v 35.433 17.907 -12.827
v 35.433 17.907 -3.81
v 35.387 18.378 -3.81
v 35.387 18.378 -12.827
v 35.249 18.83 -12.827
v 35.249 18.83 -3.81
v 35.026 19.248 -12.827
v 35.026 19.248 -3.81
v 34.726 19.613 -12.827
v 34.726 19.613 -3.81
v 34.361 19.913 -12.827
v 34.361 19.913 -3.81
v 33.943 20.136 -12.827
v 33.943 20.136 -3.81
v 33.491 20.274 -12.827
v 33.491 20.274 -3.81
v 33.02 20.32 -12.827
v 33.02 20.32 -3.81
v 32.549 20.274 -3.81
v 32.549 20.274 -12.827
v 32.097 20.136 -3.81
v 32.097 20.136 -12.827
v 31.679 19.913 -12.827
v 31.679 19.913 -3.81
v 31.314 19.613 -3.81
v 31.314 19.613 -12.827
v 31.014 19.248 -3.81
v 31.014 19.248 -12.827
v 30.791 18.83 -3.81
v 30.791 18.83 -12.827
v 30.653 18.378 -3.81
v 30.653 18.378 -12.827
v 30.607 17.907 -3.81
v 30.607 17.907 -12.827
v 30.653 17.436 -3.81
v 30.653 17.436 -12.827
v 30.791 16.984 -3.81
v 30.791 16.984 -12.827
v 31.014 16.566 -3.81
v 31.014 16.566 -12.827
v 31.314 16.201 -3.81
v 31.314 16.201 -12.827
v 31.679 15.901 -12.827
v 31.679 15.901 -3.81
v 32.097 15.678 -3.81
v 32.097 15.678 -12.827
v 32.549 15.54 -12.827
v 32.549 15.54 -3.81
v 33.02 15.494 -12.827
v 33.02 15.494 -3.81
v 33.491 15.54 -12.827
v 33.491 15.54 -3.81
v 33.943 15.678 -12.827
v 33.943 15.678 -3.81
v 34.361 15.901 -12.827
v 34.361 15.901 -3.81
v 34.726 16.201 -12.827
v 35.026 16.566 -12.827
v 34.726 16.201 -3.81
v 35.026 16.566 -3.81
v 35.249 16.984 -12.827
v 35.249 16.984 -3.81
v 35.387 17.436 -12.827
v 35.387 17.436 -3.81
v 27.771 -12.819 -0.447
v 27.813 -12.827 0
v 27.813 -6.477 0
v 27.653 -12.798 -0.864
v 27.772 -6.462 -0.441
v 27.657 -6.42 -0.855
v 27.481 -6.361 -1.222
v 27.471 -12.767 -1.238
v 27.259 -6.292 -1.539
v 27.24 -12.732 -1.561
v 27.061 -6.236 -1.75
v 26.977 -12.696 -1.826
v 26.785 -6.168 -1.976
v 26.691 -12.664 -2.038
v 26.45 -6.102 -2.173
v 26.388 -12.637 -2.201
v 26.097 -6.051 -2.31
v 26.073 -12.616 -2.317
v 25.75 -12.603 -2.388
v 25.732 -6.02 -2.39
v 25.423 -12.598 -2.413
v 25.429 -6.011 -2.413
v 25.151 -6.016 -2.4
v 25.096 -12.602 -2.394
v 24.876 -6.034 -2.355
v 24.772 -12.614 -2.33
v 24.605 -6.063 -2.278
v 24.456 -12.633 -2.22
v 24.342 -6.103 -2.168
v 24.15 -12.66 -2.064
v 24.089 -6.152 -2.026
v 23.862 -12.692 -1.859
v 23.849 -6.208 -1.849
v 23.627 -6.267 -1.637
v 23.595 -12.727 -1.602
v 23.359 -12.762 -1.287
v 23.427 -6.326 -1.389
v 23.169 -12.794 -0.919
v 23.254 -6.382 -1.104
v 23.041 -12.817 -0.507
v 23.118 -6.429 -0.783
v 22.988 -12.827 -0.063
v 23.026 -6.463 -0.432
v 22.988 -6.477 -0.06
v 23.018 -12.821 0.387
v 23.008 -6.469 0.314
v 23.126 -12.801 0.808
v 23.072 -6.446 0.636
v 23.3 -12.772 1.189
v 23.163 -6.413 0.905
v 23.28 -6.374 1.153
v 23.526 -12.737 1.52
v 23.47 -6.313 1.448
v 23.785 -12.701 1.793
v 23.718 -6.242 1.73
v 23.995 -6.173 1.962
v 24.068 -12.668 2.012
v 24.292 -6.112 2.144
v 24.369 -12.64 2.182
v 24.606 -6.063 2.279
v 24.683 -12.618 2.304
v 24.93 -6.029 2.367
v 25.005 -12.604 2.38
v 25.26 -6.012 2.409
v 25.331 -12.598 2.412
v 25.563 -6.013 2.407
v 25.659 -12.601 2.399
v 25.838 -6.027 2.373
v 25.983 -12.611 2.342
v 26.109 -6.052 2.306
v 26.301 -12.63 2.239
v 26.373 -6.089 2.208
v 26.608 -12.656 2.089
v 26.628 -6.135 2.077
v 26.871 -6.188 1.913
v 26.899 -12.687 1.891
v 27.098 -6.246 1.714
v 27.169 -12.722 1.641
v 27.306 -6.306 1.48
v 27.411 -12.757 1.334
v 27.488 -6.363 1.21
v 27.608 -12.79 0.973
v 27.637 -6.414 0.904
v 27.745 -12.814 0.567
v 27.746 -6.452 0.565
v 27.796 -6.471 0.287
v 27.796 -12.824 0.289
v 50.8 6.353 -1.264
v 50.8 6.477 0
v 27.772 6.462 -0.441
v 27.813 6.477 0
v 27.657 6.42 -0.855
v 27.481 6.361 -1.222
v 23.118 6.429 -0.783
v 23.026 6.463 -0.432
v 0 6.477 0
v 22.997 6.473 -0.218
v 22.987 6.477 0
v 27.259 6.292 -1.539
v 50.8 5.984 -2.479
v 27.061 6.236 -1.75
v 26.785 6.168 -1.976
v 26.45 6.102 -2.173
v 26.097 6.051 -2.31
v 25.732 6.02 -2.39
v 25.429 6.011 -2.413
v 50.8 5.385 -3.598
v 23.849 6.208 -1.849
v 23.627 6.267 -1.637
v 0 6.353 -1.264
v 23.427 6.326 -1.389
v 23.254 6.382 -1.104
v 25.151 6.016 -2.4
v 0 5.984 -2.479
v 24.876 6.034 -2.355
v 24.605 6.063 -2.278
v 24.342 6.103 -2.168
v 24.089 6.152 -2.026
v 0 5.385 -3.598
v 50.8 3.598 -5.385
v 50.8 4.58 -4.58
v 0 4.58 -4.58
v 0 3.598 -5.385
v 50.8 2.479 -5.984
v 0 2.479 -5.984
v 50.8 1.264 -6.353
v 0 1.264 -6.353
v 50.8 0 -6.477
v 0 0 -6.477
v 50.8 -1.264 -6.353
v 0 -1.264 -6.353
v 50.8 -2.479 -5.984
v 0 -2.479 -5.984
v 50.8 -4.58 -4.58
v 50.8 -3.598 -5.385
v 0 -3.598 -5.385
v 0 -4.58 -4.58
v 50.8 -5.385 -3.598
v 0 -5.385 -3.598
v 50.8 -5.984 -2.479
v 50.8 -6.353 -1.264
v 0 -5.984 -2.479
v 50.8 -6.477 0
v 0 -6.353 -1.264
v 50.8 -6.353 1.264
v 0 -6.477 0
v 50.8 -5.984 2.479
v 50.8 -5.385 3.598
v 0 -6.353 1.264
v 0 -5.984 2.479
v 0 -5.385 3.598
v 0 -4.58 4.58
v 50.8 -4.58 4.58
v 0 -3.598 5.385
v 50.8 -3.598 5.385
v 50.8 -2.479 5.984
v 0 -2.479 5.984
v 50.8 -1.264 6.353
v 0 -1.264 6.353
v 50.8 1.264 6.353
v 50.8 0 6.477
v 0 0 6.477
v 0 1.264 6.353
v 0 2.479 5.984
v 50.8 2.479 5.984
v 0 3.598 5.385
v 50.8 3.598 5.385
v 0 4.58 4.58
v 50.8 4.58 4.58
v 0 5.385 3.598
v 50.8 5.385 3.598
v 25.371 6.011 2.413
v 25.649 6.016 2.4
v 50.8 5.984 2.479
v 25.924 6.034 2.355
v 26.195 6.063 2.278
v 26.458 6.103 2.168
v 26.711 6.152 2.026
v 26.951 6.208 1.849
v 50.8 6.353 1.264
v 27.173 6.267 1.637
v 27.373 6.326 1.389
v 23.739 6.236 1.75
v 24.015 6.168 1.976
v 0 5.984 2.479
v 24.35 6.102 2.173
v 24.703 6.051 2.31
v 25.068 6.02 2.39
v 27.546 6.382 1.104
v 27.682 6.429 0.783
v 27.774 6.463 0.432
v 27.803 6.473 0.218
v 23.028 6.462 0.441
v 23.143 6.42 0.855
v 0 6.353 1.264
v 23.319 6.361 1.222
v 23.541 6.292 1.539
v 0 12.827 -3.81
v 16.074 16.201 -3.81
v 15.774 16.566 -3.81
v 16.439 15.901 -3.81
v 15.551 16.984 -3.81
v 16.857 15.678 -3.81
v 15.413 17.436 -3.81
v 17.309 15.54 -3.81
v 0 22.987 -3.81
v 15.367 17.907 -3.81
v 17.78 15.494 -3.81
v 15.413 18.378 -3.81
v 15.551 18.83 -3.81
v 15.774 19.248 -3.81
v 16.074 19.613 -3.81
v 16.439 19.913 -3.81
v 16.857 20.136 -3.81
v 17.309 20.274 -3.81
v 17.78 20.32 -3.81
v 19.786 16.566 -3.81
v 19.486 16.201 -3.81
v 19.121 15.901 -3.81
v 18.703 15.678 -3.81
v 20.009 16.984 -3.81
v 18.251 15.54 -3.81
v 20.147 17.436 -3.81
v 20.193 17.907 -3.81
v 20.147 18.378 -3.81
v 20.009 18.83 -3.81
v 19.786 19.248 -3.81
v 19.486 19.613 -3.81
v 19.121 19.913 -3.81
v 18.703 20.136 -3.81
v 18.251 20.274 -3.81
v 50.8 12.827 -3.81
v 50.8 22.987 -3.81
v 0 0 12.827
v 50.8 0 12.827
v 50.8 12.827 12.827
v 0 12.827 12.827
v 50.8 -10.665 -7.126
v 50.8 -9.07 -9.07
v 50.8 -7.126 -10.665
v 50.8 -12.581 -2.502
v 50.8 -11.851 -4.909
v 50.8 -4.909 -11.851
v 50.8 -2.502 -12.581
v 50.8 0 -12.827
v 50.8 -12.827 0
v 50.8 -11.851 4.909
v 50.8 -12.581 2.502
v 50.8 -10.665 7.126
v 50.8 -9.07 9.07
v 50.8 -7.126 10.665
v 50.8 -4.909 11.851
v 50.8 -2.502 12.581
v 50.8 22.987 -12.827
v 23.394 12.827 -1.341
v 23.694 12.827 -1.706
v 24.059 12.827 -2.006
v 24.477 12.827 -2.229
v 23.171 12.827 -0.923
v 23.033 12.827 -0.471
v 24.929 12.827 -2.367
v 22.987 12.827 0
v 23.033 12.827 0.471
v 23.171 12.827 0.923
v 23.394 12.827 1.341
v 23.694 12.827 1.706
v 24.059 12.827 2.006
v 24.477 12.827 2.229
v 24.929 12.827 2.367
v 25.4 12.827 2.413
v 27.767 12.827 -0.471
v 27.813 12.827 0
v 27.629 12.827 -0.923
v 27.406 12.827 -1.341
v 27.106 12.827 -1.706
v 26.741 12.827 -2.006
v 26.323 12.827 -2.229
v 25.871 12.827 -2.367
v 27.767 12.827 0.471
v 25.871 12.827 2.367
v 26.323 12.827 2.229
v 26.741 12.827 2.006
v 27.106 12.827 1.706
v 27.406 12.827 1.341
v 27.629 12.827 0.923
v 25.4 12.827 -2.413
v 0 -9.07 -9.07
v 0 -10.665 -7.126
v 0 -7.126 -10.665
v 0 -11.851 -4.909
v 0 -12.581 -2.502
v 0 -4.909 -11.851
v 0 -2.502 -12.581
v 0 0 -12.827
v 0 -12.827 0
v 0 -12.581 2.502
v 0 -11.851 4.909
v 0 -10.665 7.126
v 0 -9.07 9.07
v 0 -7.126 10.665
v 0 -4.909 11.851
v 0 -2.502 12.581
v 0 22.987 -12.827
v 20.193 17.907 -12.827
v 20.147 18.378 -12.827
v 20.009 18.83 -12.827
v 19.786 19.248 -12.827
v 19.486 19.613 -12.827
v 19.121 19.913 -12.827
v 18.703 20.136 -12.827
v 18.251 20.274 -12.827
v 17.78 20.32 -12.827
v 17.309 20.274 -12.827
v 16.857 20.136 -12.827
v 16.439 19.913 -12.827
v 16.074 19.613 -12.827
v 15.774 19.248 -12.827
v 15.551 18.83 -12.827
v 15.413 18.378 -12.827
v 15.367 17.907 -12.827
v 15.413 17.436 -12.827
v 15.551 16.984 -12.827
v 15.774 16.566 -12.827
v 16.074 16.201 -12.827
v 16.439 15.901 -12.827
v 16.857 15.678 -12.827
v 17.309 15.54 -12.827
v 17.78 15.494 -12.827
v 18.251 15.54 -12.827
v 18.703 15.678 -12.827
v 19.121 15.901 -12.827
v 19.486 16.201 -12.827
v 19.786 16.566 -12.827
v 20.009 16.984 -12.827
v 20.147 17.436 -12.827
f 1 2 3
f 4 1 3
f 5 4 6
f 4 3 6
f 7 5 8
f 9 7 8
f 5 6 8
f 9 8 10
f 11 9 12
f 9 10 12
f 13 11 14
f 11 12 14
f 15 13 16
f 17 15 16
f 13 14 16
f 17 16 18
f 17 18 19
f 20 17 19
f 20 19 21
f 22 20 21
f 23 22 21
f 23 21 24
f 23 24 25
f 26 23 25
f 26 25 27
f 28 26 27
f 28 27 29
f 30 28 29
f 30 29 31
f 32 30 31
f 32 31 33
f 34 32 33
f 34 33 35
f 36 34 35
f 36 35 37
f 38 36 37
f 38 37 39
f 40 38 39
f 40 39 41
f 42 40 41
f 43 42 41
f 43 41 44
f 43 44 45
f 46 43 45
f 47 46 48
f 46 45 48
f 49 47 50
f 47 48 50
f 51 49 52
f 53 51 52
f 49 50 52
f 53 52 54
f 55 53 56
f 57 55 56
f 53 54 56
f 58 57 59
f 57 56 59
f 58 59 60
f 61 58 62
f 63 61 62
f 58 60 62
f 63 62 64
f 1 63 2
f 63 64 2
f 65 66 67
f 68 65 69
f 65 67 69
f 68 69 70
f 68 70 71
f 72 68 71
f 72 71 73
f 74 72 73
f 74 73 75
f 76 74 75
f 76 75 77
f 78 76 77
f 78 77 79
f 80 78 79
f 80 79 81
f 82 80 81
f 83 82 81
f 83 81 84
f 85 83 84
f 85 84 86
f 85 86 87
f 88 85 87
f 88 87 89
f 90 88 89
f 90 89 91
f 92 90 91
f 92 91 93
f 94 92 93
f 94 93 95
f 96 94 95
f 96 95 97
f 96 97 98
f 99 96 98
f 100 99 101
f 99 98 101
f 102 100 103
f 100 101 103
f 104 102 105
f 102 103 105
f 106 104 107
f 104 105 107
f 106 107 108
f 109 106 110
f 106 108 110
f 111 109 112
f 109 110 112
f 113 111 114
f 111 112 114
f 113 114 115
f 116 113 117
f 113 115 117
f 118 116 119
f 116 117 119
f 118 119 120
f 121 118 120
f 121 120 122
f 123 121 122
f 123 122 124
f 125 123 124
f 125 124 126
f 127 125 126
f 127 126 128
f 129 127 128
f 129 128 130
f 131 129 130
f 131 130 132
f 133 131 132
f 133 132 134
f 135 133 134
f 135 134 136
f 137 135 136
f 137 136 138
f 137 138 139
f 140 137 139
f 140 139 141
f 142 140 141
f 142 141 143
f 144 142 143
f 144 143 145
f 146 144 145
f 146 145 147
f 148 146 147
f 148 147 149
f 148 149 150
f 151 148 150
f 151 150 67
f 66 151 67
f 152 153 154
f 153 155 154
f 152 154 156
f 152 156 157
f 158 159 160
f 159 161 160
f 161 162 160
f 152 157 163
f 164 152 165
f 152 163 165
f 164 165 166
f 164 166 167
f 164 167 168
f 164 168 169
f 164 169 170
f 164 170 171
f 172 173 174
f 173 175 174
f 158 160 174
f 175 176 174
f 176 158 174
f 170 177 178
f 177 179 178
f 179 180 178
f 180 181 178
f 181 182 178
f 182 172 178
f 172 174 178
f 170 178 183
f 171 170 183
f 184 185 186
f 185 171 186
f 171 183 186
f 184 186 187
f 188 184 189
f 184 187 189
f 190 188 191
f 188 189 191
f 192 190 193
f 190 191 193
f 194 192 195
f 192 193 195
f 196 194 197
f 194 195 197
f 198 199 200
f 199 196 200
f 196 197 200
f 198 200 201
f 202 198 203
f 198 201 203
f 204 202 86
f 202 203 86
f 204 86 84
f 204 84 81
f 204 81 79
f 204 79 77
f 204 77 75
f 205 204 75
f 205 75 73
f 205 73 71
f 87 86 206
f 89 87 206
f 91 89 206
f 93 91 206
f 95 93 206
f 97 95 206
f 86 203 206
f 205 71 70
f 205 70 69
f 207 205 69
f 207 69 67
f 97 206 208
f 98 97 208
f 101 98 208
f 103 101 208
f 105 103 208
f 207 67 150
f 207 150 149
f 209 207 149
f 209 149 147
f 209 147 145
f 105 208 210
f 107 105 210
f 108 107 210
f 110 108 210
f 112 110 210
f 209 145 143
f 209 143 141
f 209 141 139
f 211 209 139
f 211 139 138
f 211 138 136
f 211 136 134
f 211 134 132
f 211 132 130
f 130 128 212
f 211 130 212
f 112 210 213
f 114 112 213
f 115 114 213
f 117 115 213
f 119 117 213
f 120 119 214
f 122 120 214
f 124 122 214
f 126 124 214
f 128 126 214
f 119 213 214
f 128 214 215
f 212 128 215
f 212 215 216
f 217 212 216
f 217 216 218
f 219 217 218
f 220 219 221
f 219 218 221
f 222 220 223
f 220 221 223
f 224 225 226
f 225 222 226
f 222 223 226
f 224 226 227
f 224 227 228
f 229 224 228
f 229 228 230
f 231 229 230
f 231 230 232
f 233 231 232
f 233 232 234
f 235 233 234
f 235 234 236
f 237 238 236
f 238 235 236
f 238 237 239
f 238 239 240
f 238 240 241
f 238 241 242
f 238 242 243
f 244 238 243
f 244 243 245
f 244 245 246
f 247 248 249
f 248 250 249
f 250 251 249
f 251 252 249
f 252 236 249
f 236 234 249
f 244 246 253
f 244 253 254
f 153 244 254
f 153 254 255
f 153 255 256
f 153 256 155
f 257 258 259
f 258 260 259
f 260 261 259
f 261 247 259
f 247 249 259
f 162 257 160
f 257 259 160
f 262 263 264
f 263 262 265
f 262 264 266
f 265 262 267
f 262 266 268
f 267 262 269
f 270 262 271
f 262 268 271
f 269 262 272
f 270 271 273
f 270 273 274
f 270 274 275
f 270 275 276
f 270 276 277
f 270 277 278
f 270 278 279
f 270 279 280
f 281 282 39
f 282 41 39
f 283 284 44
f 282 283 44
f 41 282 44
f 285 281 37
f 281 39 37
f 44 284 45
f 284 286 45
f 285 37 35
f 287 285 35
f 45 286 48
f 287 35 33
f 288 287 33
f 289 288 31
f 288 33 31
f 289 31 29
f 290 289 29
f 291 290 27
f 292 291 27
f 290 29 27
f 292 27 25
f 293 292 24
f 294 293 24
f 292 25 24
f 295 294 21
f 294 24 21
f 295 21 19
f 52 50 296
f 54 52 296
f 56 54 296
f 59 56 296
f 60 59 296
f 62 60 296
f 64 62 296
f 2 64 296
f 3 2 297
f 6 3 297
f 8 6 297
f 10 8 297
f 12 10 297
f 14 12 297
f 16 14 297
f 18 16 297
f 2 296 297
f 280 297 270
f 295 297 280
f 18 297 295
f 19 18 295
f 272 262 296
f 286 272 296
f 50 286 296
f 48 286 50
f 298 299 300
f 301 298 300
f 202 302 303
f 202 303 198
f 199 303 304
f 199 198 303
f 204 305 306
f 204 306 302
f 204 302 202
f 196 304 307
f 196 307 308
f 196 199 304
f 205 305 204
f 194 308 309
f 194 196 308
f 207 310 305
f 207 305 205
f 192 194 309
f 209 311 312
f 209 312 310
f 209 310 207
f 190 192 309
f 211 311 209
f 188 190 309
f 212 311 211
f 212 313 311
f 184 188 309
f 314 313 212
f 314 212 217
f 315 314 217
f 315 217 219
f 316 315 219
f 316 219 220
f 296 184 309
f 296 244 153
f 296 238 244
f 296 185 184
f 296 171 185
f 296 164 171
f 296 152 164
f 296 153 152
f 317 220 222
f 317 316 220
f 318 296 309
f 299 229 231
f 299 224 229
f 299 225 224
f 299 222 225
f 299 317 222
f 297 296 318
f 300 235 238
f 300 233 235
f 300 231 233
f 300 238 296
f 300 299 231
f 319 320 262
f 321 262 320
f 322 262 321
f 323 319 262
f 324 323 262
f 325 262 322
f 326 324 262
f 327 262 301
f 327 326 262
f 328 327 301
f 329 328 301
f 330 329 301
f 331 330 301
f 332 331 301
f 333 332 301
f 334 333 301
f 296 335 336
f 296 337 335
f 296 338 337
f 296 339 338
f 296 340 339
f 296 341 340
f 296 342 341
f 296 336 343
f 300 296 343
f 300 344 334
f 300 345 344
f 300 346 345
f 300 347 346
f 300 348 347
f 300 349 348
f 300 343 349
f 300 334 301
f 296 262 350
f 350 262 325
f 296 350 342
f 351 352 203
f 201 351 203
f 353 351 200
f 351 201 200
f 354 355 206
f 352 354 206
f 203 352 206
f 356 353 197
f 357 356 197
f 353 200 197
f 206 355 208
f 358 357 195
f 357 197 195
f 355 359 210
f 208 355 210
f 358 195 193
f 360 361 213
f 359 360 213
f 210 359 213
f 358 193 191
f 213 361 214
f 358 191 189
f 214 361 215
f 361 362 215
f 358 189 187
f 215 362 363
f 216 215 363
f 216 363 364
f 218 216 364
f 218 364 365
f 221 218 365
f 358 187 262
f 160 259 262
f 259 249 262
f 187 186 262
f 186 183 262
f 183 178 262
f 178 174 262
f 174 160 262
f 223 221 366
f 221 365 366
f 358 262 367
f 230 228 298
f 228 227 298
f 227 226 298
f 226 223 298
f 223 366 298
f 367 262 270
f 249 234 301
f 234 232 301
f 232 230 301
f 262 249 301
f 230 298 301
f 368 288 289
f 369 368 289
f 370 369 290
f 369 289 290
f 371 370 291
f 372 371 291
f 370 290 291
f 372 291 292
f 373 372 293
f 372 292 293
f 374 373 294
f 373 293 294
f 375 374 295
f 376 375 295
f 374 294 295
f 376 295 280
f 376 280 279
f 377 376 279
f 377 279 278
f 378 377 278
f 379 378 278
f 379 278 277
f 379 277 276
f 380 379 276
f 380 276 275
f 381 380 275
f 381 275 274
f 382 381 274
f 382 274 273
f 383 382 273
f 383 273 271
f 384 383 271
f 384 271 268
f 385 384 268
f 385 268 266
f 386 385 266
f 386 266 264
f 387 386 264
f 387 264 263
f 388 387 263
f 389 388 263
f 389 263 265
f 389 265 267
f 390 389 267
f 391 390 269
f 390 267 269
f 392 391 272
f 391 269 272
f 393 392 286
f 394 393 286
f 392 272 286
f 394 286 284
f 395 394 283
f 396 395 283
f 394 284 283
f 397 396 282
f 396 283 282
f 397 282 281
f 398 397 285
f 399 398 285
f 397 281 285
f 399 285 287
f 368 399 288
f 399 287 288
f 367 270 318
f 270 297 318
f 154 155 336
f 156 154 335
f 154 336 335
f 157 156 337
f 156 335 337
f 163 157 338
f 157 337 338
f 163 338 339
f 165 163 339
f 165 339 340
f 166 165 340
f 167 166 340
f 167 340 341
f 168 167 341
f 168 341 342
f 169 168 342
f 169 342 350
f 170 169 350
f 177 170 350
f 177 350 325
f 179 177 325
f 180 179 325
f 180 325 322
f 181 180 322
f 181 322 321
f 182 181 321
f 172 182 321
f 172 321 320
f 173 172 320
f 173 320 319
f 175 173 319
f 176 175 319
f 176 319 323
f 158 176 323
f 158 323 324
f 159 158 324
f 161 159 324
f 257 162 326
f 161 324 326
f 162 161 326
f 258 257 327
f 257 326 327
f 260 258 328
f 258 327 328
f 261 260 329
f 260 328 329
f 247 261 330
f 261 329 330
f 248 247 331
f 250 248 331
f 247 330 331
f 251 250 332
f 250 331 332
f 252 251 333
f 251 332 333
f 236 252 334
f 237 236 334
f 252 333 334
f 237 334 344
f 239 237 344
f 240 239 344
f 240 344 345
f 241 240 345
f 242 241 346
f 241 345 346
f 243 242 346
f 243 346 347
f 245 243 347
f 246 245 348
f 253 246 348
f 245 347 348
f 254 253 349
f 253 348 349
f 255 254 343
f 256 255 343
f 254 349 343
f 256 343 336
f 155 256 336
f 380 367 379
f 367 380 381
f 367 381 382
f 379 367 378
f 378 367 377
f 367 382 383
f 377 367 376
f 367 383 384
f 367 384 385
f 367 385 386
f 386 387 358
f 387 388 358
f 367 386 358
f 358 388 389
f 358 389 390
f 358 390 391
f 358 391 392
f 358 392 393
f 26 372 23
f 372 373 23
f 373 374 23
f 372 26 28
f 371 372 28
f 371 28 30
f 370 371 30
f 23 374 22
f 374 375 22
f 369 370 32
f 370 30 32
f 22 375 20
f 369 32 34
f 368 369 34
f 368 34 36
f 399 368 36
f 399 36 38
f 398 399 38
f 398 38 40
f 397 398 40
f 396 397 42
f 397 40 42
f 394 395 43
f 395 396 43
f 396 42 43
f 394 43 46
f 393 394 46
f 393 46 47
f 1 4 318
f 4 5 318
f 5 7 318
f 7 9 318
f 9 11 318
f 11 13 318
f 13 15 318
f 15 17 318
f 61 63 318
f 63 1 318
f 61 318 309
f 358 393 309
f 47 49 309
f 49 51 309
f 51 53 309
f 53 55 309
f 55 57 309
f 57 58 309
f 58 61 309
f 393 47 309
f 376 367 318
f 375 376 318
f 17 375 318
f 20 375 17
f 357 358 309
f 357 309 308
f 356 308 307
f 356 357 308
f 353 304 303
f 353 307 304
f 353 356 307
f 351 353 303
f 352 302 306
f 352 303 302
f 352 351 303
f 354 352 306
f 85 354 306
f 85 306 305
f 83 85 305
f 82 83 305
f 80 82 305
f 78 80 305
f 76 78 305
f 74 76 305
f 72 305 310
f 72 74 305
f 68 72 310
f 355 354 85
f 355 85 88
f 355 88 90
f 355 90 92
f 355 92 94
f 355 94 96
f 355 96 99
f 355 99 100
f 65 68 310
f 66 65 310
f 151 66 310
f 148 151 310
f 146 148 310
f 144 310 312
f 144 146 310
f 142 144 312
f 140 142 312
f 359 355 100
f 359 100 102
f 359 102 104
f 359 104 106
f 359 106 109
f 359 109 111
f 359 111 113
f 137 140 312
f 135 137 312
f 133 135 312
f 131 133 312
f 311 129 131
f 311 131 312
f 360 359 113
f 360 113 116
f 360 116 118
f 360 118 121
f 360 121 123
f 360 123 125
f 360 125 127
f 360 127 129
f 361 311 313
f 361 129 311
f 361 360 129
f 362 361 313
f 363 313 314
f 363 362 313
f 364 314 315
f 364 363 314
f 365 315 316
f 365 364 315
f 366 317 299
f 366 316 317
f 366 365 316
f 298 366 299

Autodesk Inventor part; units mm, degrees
ref_plane "YZ Plane" through (0, 0, 0) normal (1, 0, 0) x (0, 1, 0)
ref_plane "XZ Plane" through (0, 0, 0) normal (0, 1, 0) x (-1, 0, 0)
ref_plane "XY Plane" through (0, 0, 0) normal (0, 0, 1) x (1, 0, 0)
sketch "Sketch1" plane through (0, 0, 0) normal (1, 0, 0) x (0, 1, 0)
  circle A0 centre (0, 0) radius 6.477
  circle A1 centre (0, 0) radius 12.827
  dimension "d0" = 12.954
  dimension "d1" = 25.654
extrude "Extrusion1" add sketch "Sketch1" along normal blind 50.8
sketch "Sketch2" plane through (50.8, 0, 0) normal (1, 0, 0) x (0, 0, -1)
  circle A0 centre (0, 0) radius 12.827 projected
  circle A1 centre (0, 0) radius 6.477 projected
  line L0 (0, 0) -> (0, 12.827) construction
  line L1 (0, 12.827) -> (-3.81, 12.827)
  arc A2 (-12.827, 0) -> (12.827, 0) centre (0, 0) ccw construction
  line L2 (0, 0) -> (12.827, 0) construction
  line L3 (0, 0) -> (-12.827, 0) construction
  line L4 (-12.827, 0) -> (-12.827, 12.827)
  line L5 (-12.827, 12.827) -> (0, 12.827)
  line L6 (12.827, 12.827) -> (12.827, 0)
  circle A3 centre (0, 0) radius 12.827 projected
  line L7 (12.827, 12.827) -> (3.81, 12.827) construction
  arc A4 (0, 12.827) -> (-12.827, 0) centre (0, 0) ccw
  arc A5 (12.827, 0) -> (0, 12.827) centre (0, 0) ccw
  line L8 (0, 12.827) -> (3.81, 12.827)
  line L9 (3.81, 12.827) -> (3.81, 22.987)
  line L10 (3.81, 22.987) -> (12.827, 22.987)
  line L11 (12.827, 22.987) -> (12.827, 12.827)
  line L12 (3.81, 12.827) -> (0, 12.827)
  point P0 (12.827, 0)
  dimension "d5" = 3.81
  dimension "d6" = 10.16
extrude "Extrusion2" add sketch "Sketch2" against normal blind 50.8 contours A0 L8 L9 L10 L11 L6 | A0 L4 L5 L1
sketch "Sketch3" plane through (50.8, 12.827, -3.81) normal (0, 0, 1) x (1, 0, 0)
  line L0 (0, 0) -> (-50.8, 0) projected
  line L1 (0, 10.16) -> (-50.8, 10.16) projected
  line L2 (-50.8, 0) -> (-50.8, 10.16) projected
  line L3 (0, 10.16) -> (0, 0) projected
  line L4 (-25.4, 10.16) -> (-25.4, 0) construction
  line L5 (-25.4, 5.08) -> (-17.78, 5.08) construction
  circle A0 centre (-17.78, 5.08) radius 2.413
  circle A1 centre (-33.02, 5.08) radius 2.413
  point P0 (-50.8, -12.827)
  dimension "d9" = 7.62
  dimension "d11" = 4.826
extrude "Extrusion3" cut sketch "Sketch3" against normal through all contours A0 | A1
sketch "Sketch4" plane through (50.8, 12.827, 12.827) normal (0, 1, 0) x (1, 0, 0)
  line L0 (0, 16.637) -> (0, 0) projected
  line L1 (0, 16.637) -> (-50.8, 16.637) projected
  line L2 (-50.8, 0) -> (-50.8, 16.637) projected
  line L3 (0, 0) -> (-50.8, 0) projected
  line L4 (-25.4, 0) -> (-25.4, 16.637) construction
  line L5 (0, 19.304) -> (0, 6.35) projected
  line L6 (0, 12.827) -> (-50.8, 12.827) construction
  circle A0 centre (-25.4, 12.827) radius 2.413
  dimension "d15" = 4.826
extrude "Extrusion4" cut sketch "Sketch4" against normal through all contours A0
properties part number "arm_to_camera"
